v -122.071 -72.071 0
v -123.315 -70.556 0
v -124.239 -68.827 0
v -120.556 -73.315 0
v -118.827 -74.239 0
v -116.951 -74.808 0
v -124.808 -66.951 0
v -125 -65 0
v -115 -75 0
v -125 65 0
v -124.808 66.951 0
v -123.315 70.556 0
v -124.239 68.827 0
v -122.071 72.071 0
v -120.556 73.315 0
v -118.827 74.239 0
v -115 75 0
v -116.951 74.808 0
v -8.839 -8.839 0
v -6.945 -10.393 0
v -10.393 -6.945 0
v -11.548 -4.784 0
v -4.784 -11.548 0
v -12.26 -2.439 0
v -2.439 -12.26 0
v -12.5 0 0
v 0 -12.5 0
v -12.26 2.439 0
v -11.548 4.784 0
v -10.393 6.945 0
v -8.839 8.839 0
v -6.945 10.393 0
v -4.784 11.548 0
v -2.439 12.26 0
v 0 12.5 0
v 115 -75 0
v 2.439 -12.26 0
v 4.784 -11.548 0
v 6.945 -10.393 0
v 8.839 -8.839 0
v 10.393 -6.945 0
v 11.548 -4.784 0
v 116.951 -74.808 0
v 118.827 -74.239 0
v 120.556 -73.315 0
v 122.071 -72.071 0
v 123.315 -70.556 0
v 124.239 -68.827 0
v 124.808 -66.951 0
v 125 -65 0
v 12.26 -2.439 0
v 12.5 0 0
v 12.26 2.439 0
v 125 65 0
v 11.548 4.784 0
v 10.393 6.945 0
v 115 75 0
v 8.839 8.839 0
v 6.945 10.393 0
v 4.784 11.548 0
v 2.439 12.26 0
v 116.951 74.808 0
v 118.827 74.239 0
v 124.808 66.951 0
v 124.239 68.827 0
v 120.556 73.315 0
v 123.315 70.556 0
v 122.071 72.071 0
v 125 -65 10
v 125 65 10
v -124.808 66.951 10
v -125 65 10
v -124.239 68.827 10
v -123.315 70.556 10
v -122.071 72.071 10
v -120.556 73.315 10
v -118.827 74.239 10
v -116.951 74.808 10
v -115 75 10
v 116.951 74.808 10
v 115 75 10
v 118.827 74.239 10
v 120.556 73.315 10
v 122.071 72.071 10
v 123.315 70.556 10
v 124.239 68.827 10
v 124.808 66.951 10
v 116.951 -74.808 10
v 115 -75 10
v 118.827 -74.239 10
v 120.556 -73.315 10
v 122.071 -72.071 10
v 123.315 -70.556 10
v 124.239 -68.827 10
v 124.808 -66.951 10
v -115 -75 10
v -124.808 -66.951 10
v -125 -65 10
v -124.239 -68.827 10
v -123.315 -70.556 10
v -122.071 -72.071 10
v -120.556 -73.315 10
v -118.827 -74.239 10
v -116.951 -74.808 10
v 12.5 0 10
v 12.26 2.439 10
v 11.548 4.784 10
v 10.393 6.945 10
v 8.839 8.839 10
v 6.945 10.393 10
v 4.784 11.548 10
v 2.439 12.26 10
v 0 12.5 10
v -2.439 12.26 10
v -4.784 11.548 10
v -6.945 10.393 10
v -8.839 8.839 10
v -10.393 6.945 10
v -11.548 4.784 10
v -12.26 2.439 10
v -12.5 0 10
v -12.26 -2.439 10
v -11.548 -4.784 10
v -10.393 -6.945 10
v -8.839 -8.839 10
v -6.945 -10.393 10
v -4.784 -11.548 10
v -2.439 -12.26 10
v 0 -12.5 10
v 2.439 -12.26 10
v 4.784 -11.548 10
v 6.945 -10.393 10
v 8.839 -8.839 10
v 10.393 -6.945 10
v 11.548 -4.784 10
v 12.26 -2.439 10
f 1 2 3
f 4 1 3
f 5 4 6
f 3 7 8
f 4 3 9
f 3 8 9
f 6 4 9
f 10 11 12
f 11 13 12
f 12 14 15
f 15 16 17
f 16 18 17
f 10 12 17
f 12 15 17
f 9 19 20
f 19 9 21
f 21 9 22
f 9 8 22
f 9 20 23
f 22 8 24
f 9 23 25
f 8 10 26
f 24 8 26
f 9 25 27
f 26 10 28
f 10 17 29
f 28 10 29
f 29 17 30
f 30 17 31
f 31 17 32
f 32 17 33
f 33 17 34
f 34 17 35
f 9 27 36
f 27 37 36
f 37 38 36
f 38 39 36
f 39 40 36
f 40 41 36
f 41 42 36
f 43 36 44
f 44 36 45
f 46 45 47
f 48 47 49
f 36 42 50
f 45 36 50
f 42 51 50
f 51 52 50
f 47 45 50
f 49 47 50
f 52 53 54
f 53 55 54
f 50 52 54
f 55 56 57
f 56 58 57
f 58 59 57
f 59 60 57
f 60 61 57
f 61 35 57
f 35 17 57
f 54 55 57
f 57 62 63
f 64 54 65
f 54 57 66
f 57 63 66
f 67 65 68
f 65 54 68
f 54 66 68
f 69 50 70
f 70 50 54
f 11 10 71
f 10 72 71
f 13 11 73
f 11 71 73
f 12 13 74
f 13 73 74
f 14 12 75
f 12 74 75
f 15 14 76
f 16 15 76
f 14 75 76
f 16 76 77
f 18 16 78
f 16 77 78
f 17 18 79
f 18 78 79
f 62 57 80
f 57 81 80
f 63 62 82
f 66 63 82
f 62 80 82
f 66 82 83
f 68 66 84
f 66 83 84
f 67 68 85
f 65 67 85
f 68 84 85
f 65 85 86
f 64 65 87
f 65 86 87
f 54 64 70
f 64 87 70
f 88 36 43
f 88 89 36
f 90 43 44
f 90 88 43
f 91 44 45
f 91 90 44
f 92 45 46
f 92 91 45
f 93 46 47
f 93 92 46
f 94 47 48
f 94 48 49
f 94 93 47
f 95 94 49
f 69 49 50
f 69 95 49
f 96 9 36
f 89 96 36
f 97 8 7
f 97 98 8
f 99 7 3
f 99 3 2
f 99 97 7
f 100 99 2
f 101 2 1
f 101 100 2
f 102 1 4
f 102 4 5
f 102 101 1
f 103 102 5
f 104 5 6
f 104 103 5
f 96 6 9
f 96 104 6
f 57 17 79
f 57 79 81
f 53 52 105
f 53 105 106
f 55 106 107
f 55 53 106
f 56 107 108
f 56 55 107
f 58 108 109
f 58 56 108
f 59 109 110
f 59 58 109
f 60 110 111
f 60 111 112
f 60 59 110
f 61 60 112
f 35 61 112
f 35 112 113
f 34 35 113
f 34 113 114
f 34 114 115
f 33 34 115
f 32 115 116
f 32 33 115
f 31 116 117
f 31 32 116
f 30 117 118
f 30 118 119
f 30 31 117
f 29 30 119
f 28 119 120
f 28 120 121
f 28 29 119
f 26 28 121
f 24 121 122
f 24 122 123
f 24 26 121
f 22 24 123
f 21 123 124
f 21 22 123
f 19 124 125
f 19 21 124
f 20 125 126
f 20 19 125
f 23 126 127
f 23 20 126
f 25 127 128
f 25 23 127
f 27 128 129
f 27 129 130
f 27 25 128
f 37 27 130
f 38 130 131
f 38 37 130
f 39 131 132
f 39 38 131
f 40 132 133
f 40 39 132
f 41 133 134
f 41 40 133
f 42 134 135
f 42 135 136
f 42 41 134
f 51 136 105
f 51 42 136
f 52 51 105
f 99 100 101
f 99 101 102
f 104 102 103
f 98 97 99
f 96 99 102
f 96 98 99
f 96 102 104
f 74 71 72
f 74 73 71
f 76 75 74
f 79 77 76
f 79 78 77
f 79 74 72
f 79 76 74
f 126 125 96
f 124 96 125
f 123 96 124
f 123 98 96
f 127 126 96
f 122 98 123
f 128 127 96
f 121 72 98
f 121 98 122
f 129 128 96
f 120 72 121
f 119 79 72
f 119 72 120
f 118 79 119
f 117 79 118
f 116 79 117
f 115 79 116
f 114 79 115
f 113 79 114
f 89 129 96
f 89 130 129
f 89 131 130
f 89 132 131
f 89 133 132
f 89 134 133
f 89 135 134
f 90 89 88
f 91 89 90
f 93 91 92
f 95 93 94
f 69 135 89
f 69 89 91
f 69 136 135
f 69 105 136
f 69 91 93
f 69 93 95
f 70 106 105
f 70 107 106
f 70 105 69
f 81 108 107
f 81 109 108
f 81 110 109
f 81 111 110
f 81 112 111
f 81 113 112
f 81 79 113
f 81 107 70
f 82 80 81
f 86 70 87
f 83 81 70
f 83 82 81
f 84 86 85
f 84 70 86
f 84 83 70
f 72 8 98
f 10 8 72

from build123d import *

# Parameters (mm, degrees)
SKIZZE1_W                       = 250
SKIZZE1_H                       = 150
SKIZZE1_R                       = 12.5
AUFSATZ_LINEAR_AUSTRAGEN1_DEPTH = 10
VERRUNDUNG1_R                   = 10


with BuildPart() as part:
    # Skizze1 → Aufsatz-Linear austragen1 (new body)
    with BuildSketch(Plane.XY):
        Rectangle(SKIZZE1_W, SKIZZE1_H)
        Circle(SKIZZE1_R, mode=Mode.SUBTRACT)
    extrude(amount=AUFSATZ_LINEAR_AUSTRAGEN1_DEPTH)

    # Verrundung1
    verrundung1_edges = [part.edges().sort_by_distance(p)[0] for p in [
        (-125, 75, 5),
        (125, 75, 5),
        (125, -75, 5),
        (-125, -75, 5),
    ]]
    fillet(verrundung1_edges, radius=VERRUNDUNG1_R)


solid = part.part
